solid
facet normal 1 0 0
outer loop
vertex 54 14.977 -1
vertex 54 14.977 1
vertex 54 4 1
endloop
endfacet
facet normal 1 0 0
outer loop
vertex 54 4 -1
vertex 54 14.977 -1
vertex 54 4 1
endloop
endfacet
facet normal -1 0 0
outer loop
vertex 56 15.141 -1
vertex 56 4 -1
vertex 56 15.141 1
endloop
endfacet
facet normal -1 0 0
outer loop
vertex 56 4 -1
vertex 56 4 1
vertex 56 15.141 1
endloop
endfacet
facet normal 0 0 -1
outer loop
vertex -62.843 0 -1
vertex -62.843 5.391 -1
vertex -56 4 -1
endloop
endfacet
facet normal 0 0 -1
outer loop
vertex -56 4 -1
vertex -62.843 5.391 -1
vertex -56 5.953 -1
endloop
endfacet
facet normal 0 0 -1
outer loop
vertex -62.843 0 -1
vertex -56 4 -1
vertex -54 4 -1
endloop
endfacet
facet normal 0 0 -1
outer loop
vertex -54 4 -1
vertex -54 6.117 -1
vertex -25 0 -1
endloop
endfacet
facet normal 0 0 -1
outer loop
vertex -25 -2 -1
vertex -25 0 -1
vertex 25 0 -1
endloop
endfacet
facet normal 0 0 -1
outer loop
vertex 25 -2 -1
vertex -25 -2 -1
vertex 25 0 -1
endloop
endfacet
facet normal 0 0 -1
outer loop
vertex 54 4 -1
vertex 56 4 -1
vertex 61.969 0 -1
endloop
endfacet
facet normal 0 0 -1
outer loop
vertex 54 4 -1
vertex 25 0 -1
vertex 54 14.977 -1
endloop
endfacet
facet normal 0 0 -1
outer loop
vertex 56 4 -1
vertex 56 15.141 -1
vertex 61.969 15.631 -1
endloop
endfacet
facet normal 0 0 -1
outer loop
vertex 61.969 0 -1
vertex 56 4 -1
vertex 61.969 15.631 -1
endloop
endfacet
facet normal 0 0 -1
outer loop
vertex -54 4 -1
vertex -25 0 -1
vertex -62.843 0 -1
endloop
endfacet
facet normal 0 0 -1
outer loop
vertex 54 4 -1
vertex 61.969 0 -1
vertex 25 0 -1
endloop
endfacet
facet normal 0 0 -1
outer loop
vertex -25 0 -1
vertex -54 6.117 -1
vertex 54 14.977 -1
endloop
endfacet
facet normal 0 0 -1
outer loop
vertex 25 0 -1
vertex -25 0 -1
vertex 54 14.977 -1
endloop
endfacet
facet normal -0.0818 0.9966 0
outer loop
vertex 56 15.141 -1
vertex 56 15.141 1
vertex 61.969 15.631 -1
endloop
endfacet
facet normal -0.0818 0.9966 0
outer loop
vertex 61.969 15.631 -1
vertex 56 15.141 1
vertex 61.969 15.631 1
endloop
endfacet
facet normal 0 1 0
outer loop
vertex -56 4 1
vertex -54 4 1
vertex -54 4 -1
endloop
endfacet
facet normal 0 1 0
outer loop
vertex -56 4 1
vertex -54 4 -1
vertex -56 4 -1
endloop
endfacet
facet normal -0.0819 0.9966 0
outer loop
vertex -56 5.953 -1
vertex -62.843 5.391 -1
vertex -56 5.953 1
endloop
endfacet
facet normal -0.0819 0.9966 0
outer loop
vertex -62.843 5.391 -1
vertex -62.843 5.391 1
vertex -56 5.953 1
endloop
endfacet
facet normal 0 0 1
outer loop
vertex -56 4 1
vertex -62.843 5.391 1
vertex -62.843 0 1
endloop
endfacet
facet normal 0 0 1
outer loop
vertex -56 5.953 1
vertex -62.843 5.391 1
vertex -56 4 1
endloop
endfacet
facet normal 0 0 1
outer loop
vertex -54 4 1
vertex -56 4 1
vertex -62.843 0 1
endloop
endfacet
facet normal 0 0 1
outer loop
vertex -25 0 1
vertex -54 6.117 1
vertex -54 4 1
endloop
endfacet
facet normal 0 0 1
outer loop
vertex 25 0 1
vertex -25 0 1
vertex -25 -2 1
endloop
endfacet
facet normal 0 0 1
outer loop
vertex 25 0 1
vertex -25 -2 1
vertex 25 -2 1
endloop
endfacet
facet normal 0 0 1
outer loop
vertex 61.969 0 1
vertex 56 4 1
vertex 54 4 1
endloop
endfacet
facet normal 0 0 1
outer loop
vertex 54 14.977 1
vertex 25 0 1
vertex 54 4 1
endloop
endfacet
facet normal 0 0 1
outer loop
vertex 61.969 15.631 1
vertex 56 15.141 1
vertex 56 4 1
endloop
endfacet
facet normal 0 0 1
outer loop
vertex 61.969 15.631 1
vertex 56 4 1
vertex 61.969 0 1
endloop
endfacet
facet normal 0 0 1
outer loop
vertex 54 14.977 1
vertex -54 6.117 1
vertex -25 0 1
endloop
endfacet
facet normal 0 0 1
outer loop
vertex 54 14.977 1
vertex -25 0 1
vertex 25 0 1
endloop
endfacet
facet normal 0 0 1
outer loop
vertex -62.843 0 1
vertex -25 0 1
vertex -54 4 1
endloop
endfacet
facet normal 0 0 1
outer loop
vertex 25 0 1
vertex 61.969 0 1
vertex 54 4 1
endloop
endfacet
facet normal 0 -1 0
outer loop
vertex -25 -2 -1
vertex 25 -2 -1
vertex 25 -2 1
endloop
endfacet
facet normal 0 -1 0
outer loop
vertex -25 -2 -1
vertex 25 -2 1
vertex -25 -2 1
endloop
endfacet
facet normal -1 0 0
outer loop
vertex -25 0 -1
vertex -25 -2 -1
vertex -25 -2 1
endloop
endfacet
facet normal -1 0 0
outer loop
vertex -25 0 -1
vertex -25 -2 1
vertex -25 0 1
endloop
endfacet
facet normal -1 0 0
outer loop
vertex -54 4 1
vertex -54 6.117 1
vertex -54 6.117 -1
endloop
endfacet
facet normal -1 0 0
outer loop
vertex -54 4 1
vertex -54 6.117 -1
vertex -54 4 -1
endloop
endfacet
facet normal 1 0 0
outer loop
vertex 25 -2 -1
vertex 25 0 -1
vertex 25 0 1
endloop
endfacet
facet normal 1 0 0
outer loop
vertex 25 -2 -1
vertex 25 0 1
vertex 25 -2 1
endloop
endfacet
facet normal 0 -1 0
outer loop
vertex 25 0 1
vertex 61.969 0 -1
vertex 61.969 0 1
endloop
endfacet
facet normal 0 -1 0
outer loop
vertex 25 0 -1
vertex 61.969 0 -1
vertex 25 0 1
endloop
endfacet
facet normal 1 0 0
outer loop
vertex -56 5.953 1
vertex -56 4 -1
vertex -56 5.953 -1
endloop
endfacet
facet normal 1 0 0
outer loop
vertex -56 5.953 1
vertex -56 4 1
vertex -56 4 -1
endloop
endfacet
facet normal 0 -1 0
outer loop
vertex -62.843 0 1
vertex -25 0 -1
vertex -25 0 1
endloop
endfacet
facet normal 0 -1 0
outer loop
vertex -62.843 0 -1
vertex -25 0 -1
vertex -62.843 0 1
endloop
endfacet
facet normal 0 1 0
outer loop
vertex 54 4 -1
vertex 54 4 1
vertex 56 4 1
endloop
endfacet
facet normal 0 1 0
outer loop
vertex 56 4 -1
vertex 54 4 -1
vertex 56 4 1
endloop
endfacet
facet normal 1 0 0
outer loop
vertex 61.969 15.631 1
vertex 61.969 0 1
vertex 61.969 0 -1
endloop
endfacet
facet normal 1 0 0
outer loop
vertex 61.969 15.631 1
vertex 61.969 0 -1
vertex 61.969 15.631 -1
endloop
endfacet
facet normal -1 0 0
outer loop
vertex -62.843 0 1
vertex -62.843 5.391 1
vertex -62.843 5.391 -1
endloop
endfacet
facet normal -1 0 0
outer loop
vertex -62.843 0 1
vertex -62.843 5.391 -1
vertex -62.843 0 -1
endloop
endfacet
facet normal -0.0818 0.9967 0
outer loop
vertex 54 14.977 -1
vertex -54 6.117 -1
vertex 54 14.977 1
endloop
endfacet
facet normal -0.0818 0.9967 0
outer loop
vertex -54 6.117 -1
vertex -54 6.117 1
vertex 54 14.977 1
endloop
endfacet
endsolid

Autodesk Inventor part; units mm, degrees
ref_plane "YZ Plane" through (0, 0, 0) normal (1, 0, 0) x (0, 1, 0)
ref_plane "XZ Plane" through (0, 0, 0) normal (0, 1, 0) x (-1, 0, 0)
ref_plane "XY Plane" through (0, 0, 0) normal (0, 0, 1) x (1, 0, 0)
sketch "Sketch1" plane through (0, 0, 0) normal (0, 0, 1) x (1, 0, 0)
  line L0 (-64, 50) -> (64, 50)
  line L1 (64, 50) -> (64, 0)
  line L2 (64, 0) -> (-64, 0)
  line L3 (-64, 0) -> (-64, 50)
  line L4 (-25, 0) -> (25, 0)
  line L5 (25, 0) -> (25, -2)
  line L6 (25, -2) -> (-25, -2)
  line L7 (-25, -2) -> (-25, 0)
  point P0 (0, 0)
  point P1 (0, 0)
  dimension "d0" = 50
  dimension "d1" = 128
  dimension "d2" = 2
  dimension "d3" = 50
extrude "Extrusion1" add sketch "Sketch1" along normal mid plane 2
sketch "Sketch2" plane through (0, 0, 1) normal (0, 0, 1) x (1, 0, 0)
  line L0 (53.9533, 19.1647) -> (54.2948, 15.001) projected
  line L1 (54.2948, 15.001) -> (-55.3369, 6.0072) projected
  line L2 (-55.3369, 6.0072) -> (-55.6784, 10.1709) projected
  line L3 (-55.6784, 10.1709) -> (53.9533, 19.1647) projected
  line L4 (62.1376, 13.5765) -> (61.7855, 17.8679) projected
  line L5 (-63.1946, 7.615) -> (-62.8426, 3.3235) projected
  point P0 (0, 0)
sketch "Sketch3" plane through (0, 0, 1) normal (0, 0, 1) x (1, 0, 0)
  line L0 (-63.1946, 7.615) -> (-62.8426, 3.3235) construction
  line L1 (62.1376, 13.5765) -> (61.7855, 17.8679) construction
  line L2 (54.2948, 15.001) -> (-55.3369, 6.0072) construction
  line L3 (-62.8426, 5.3914) -> (61.9691, 15.6306)
  line L4 (-62.8426, 5.3914) -> (-62.8426, 0)
  line L5 (-62.8426, 0) -> (-72.8426, 0)
  line L6 (-72.8426, 0) -> (-72.8426, 60)
  line L7 (-72.8426, 60) -> (71.9691, 60)
  line L8 (71.9691, 60) -> (71.9691, 0)
  line L9 (71.9691, 0) -> (61.9691, 0)
  line L10 (61.9691, 0) -> (61.9691, 15.6306)
  point P0 (0, 0)
  dimension "d6" = 10
  dimension "d7" = 60
  dimension "d8" = 10
extrude "Extrusion2" cut sketch "Sketch3" against normal through all
sketch "Sketch4" plane through (0, 0, 1) normal (0, 0, 1) x (1, 0, 0)
  line L0 (56, 14.7768) -> (56, 0) projected
  line L1 (54, 14.7768) -> (56, 14.7768) projected
  line L2 (54, 0) -> (54, 14.7768) projected
  line L3 (56, 0) -> (54, 0) projected
  line L4 (-54, 5.783) -> (-54, 0) projected
  line L5 (-56, 5.783) -> (-54, 5.783) projected
  line L6 (-56, 0) -> (-56, 5.783) projected
  line L7 (-54, 0) -> (-56, 0) projected
  point P0 (0, 0)
sketch "Sketch5" plane through (0, 0, 1) normal (0, 0, 1) x (1, 0, 0)
  line L0 (-56, 0) -> (-56, 5.783) construction
  line L1 (-54, 5.783) -> (-54, 0) construction
  line L2 (54, 0) -> (54, 14.7768) construction
  line L3 (56, 14.7768) -> (56, 0) construction
  line L4 (-54, 4) -> (-56, 4)
  line L5 (-56, 4) -> (-56, 24)
  line L6 (-56, 24) -> (-54, 24)
  line L7 (-54, 24) -> (-54, 4)
  line L8 (56, 24) -> (54, 24)
  line L9 (54, 24) -> (54, 4)
  line L10 (54, 4) -> (56, 4)
  line L11 (56, 4) -> (56, 24)
  line L12 (-62.8426, 0) -> (-25, 0) projected
  line L13 (25, 0) -> (61.9691, 0) projected
  point P0 (0, 0)
  dimension "d11" = 4
  dimension "d12" = 20
  dimension "d13" = 4
  dimension "d14" = 20
extrude "Extrusion3" cut sketch "Sketch5" against normal through all
properties part number "angle_plate_long_short"
